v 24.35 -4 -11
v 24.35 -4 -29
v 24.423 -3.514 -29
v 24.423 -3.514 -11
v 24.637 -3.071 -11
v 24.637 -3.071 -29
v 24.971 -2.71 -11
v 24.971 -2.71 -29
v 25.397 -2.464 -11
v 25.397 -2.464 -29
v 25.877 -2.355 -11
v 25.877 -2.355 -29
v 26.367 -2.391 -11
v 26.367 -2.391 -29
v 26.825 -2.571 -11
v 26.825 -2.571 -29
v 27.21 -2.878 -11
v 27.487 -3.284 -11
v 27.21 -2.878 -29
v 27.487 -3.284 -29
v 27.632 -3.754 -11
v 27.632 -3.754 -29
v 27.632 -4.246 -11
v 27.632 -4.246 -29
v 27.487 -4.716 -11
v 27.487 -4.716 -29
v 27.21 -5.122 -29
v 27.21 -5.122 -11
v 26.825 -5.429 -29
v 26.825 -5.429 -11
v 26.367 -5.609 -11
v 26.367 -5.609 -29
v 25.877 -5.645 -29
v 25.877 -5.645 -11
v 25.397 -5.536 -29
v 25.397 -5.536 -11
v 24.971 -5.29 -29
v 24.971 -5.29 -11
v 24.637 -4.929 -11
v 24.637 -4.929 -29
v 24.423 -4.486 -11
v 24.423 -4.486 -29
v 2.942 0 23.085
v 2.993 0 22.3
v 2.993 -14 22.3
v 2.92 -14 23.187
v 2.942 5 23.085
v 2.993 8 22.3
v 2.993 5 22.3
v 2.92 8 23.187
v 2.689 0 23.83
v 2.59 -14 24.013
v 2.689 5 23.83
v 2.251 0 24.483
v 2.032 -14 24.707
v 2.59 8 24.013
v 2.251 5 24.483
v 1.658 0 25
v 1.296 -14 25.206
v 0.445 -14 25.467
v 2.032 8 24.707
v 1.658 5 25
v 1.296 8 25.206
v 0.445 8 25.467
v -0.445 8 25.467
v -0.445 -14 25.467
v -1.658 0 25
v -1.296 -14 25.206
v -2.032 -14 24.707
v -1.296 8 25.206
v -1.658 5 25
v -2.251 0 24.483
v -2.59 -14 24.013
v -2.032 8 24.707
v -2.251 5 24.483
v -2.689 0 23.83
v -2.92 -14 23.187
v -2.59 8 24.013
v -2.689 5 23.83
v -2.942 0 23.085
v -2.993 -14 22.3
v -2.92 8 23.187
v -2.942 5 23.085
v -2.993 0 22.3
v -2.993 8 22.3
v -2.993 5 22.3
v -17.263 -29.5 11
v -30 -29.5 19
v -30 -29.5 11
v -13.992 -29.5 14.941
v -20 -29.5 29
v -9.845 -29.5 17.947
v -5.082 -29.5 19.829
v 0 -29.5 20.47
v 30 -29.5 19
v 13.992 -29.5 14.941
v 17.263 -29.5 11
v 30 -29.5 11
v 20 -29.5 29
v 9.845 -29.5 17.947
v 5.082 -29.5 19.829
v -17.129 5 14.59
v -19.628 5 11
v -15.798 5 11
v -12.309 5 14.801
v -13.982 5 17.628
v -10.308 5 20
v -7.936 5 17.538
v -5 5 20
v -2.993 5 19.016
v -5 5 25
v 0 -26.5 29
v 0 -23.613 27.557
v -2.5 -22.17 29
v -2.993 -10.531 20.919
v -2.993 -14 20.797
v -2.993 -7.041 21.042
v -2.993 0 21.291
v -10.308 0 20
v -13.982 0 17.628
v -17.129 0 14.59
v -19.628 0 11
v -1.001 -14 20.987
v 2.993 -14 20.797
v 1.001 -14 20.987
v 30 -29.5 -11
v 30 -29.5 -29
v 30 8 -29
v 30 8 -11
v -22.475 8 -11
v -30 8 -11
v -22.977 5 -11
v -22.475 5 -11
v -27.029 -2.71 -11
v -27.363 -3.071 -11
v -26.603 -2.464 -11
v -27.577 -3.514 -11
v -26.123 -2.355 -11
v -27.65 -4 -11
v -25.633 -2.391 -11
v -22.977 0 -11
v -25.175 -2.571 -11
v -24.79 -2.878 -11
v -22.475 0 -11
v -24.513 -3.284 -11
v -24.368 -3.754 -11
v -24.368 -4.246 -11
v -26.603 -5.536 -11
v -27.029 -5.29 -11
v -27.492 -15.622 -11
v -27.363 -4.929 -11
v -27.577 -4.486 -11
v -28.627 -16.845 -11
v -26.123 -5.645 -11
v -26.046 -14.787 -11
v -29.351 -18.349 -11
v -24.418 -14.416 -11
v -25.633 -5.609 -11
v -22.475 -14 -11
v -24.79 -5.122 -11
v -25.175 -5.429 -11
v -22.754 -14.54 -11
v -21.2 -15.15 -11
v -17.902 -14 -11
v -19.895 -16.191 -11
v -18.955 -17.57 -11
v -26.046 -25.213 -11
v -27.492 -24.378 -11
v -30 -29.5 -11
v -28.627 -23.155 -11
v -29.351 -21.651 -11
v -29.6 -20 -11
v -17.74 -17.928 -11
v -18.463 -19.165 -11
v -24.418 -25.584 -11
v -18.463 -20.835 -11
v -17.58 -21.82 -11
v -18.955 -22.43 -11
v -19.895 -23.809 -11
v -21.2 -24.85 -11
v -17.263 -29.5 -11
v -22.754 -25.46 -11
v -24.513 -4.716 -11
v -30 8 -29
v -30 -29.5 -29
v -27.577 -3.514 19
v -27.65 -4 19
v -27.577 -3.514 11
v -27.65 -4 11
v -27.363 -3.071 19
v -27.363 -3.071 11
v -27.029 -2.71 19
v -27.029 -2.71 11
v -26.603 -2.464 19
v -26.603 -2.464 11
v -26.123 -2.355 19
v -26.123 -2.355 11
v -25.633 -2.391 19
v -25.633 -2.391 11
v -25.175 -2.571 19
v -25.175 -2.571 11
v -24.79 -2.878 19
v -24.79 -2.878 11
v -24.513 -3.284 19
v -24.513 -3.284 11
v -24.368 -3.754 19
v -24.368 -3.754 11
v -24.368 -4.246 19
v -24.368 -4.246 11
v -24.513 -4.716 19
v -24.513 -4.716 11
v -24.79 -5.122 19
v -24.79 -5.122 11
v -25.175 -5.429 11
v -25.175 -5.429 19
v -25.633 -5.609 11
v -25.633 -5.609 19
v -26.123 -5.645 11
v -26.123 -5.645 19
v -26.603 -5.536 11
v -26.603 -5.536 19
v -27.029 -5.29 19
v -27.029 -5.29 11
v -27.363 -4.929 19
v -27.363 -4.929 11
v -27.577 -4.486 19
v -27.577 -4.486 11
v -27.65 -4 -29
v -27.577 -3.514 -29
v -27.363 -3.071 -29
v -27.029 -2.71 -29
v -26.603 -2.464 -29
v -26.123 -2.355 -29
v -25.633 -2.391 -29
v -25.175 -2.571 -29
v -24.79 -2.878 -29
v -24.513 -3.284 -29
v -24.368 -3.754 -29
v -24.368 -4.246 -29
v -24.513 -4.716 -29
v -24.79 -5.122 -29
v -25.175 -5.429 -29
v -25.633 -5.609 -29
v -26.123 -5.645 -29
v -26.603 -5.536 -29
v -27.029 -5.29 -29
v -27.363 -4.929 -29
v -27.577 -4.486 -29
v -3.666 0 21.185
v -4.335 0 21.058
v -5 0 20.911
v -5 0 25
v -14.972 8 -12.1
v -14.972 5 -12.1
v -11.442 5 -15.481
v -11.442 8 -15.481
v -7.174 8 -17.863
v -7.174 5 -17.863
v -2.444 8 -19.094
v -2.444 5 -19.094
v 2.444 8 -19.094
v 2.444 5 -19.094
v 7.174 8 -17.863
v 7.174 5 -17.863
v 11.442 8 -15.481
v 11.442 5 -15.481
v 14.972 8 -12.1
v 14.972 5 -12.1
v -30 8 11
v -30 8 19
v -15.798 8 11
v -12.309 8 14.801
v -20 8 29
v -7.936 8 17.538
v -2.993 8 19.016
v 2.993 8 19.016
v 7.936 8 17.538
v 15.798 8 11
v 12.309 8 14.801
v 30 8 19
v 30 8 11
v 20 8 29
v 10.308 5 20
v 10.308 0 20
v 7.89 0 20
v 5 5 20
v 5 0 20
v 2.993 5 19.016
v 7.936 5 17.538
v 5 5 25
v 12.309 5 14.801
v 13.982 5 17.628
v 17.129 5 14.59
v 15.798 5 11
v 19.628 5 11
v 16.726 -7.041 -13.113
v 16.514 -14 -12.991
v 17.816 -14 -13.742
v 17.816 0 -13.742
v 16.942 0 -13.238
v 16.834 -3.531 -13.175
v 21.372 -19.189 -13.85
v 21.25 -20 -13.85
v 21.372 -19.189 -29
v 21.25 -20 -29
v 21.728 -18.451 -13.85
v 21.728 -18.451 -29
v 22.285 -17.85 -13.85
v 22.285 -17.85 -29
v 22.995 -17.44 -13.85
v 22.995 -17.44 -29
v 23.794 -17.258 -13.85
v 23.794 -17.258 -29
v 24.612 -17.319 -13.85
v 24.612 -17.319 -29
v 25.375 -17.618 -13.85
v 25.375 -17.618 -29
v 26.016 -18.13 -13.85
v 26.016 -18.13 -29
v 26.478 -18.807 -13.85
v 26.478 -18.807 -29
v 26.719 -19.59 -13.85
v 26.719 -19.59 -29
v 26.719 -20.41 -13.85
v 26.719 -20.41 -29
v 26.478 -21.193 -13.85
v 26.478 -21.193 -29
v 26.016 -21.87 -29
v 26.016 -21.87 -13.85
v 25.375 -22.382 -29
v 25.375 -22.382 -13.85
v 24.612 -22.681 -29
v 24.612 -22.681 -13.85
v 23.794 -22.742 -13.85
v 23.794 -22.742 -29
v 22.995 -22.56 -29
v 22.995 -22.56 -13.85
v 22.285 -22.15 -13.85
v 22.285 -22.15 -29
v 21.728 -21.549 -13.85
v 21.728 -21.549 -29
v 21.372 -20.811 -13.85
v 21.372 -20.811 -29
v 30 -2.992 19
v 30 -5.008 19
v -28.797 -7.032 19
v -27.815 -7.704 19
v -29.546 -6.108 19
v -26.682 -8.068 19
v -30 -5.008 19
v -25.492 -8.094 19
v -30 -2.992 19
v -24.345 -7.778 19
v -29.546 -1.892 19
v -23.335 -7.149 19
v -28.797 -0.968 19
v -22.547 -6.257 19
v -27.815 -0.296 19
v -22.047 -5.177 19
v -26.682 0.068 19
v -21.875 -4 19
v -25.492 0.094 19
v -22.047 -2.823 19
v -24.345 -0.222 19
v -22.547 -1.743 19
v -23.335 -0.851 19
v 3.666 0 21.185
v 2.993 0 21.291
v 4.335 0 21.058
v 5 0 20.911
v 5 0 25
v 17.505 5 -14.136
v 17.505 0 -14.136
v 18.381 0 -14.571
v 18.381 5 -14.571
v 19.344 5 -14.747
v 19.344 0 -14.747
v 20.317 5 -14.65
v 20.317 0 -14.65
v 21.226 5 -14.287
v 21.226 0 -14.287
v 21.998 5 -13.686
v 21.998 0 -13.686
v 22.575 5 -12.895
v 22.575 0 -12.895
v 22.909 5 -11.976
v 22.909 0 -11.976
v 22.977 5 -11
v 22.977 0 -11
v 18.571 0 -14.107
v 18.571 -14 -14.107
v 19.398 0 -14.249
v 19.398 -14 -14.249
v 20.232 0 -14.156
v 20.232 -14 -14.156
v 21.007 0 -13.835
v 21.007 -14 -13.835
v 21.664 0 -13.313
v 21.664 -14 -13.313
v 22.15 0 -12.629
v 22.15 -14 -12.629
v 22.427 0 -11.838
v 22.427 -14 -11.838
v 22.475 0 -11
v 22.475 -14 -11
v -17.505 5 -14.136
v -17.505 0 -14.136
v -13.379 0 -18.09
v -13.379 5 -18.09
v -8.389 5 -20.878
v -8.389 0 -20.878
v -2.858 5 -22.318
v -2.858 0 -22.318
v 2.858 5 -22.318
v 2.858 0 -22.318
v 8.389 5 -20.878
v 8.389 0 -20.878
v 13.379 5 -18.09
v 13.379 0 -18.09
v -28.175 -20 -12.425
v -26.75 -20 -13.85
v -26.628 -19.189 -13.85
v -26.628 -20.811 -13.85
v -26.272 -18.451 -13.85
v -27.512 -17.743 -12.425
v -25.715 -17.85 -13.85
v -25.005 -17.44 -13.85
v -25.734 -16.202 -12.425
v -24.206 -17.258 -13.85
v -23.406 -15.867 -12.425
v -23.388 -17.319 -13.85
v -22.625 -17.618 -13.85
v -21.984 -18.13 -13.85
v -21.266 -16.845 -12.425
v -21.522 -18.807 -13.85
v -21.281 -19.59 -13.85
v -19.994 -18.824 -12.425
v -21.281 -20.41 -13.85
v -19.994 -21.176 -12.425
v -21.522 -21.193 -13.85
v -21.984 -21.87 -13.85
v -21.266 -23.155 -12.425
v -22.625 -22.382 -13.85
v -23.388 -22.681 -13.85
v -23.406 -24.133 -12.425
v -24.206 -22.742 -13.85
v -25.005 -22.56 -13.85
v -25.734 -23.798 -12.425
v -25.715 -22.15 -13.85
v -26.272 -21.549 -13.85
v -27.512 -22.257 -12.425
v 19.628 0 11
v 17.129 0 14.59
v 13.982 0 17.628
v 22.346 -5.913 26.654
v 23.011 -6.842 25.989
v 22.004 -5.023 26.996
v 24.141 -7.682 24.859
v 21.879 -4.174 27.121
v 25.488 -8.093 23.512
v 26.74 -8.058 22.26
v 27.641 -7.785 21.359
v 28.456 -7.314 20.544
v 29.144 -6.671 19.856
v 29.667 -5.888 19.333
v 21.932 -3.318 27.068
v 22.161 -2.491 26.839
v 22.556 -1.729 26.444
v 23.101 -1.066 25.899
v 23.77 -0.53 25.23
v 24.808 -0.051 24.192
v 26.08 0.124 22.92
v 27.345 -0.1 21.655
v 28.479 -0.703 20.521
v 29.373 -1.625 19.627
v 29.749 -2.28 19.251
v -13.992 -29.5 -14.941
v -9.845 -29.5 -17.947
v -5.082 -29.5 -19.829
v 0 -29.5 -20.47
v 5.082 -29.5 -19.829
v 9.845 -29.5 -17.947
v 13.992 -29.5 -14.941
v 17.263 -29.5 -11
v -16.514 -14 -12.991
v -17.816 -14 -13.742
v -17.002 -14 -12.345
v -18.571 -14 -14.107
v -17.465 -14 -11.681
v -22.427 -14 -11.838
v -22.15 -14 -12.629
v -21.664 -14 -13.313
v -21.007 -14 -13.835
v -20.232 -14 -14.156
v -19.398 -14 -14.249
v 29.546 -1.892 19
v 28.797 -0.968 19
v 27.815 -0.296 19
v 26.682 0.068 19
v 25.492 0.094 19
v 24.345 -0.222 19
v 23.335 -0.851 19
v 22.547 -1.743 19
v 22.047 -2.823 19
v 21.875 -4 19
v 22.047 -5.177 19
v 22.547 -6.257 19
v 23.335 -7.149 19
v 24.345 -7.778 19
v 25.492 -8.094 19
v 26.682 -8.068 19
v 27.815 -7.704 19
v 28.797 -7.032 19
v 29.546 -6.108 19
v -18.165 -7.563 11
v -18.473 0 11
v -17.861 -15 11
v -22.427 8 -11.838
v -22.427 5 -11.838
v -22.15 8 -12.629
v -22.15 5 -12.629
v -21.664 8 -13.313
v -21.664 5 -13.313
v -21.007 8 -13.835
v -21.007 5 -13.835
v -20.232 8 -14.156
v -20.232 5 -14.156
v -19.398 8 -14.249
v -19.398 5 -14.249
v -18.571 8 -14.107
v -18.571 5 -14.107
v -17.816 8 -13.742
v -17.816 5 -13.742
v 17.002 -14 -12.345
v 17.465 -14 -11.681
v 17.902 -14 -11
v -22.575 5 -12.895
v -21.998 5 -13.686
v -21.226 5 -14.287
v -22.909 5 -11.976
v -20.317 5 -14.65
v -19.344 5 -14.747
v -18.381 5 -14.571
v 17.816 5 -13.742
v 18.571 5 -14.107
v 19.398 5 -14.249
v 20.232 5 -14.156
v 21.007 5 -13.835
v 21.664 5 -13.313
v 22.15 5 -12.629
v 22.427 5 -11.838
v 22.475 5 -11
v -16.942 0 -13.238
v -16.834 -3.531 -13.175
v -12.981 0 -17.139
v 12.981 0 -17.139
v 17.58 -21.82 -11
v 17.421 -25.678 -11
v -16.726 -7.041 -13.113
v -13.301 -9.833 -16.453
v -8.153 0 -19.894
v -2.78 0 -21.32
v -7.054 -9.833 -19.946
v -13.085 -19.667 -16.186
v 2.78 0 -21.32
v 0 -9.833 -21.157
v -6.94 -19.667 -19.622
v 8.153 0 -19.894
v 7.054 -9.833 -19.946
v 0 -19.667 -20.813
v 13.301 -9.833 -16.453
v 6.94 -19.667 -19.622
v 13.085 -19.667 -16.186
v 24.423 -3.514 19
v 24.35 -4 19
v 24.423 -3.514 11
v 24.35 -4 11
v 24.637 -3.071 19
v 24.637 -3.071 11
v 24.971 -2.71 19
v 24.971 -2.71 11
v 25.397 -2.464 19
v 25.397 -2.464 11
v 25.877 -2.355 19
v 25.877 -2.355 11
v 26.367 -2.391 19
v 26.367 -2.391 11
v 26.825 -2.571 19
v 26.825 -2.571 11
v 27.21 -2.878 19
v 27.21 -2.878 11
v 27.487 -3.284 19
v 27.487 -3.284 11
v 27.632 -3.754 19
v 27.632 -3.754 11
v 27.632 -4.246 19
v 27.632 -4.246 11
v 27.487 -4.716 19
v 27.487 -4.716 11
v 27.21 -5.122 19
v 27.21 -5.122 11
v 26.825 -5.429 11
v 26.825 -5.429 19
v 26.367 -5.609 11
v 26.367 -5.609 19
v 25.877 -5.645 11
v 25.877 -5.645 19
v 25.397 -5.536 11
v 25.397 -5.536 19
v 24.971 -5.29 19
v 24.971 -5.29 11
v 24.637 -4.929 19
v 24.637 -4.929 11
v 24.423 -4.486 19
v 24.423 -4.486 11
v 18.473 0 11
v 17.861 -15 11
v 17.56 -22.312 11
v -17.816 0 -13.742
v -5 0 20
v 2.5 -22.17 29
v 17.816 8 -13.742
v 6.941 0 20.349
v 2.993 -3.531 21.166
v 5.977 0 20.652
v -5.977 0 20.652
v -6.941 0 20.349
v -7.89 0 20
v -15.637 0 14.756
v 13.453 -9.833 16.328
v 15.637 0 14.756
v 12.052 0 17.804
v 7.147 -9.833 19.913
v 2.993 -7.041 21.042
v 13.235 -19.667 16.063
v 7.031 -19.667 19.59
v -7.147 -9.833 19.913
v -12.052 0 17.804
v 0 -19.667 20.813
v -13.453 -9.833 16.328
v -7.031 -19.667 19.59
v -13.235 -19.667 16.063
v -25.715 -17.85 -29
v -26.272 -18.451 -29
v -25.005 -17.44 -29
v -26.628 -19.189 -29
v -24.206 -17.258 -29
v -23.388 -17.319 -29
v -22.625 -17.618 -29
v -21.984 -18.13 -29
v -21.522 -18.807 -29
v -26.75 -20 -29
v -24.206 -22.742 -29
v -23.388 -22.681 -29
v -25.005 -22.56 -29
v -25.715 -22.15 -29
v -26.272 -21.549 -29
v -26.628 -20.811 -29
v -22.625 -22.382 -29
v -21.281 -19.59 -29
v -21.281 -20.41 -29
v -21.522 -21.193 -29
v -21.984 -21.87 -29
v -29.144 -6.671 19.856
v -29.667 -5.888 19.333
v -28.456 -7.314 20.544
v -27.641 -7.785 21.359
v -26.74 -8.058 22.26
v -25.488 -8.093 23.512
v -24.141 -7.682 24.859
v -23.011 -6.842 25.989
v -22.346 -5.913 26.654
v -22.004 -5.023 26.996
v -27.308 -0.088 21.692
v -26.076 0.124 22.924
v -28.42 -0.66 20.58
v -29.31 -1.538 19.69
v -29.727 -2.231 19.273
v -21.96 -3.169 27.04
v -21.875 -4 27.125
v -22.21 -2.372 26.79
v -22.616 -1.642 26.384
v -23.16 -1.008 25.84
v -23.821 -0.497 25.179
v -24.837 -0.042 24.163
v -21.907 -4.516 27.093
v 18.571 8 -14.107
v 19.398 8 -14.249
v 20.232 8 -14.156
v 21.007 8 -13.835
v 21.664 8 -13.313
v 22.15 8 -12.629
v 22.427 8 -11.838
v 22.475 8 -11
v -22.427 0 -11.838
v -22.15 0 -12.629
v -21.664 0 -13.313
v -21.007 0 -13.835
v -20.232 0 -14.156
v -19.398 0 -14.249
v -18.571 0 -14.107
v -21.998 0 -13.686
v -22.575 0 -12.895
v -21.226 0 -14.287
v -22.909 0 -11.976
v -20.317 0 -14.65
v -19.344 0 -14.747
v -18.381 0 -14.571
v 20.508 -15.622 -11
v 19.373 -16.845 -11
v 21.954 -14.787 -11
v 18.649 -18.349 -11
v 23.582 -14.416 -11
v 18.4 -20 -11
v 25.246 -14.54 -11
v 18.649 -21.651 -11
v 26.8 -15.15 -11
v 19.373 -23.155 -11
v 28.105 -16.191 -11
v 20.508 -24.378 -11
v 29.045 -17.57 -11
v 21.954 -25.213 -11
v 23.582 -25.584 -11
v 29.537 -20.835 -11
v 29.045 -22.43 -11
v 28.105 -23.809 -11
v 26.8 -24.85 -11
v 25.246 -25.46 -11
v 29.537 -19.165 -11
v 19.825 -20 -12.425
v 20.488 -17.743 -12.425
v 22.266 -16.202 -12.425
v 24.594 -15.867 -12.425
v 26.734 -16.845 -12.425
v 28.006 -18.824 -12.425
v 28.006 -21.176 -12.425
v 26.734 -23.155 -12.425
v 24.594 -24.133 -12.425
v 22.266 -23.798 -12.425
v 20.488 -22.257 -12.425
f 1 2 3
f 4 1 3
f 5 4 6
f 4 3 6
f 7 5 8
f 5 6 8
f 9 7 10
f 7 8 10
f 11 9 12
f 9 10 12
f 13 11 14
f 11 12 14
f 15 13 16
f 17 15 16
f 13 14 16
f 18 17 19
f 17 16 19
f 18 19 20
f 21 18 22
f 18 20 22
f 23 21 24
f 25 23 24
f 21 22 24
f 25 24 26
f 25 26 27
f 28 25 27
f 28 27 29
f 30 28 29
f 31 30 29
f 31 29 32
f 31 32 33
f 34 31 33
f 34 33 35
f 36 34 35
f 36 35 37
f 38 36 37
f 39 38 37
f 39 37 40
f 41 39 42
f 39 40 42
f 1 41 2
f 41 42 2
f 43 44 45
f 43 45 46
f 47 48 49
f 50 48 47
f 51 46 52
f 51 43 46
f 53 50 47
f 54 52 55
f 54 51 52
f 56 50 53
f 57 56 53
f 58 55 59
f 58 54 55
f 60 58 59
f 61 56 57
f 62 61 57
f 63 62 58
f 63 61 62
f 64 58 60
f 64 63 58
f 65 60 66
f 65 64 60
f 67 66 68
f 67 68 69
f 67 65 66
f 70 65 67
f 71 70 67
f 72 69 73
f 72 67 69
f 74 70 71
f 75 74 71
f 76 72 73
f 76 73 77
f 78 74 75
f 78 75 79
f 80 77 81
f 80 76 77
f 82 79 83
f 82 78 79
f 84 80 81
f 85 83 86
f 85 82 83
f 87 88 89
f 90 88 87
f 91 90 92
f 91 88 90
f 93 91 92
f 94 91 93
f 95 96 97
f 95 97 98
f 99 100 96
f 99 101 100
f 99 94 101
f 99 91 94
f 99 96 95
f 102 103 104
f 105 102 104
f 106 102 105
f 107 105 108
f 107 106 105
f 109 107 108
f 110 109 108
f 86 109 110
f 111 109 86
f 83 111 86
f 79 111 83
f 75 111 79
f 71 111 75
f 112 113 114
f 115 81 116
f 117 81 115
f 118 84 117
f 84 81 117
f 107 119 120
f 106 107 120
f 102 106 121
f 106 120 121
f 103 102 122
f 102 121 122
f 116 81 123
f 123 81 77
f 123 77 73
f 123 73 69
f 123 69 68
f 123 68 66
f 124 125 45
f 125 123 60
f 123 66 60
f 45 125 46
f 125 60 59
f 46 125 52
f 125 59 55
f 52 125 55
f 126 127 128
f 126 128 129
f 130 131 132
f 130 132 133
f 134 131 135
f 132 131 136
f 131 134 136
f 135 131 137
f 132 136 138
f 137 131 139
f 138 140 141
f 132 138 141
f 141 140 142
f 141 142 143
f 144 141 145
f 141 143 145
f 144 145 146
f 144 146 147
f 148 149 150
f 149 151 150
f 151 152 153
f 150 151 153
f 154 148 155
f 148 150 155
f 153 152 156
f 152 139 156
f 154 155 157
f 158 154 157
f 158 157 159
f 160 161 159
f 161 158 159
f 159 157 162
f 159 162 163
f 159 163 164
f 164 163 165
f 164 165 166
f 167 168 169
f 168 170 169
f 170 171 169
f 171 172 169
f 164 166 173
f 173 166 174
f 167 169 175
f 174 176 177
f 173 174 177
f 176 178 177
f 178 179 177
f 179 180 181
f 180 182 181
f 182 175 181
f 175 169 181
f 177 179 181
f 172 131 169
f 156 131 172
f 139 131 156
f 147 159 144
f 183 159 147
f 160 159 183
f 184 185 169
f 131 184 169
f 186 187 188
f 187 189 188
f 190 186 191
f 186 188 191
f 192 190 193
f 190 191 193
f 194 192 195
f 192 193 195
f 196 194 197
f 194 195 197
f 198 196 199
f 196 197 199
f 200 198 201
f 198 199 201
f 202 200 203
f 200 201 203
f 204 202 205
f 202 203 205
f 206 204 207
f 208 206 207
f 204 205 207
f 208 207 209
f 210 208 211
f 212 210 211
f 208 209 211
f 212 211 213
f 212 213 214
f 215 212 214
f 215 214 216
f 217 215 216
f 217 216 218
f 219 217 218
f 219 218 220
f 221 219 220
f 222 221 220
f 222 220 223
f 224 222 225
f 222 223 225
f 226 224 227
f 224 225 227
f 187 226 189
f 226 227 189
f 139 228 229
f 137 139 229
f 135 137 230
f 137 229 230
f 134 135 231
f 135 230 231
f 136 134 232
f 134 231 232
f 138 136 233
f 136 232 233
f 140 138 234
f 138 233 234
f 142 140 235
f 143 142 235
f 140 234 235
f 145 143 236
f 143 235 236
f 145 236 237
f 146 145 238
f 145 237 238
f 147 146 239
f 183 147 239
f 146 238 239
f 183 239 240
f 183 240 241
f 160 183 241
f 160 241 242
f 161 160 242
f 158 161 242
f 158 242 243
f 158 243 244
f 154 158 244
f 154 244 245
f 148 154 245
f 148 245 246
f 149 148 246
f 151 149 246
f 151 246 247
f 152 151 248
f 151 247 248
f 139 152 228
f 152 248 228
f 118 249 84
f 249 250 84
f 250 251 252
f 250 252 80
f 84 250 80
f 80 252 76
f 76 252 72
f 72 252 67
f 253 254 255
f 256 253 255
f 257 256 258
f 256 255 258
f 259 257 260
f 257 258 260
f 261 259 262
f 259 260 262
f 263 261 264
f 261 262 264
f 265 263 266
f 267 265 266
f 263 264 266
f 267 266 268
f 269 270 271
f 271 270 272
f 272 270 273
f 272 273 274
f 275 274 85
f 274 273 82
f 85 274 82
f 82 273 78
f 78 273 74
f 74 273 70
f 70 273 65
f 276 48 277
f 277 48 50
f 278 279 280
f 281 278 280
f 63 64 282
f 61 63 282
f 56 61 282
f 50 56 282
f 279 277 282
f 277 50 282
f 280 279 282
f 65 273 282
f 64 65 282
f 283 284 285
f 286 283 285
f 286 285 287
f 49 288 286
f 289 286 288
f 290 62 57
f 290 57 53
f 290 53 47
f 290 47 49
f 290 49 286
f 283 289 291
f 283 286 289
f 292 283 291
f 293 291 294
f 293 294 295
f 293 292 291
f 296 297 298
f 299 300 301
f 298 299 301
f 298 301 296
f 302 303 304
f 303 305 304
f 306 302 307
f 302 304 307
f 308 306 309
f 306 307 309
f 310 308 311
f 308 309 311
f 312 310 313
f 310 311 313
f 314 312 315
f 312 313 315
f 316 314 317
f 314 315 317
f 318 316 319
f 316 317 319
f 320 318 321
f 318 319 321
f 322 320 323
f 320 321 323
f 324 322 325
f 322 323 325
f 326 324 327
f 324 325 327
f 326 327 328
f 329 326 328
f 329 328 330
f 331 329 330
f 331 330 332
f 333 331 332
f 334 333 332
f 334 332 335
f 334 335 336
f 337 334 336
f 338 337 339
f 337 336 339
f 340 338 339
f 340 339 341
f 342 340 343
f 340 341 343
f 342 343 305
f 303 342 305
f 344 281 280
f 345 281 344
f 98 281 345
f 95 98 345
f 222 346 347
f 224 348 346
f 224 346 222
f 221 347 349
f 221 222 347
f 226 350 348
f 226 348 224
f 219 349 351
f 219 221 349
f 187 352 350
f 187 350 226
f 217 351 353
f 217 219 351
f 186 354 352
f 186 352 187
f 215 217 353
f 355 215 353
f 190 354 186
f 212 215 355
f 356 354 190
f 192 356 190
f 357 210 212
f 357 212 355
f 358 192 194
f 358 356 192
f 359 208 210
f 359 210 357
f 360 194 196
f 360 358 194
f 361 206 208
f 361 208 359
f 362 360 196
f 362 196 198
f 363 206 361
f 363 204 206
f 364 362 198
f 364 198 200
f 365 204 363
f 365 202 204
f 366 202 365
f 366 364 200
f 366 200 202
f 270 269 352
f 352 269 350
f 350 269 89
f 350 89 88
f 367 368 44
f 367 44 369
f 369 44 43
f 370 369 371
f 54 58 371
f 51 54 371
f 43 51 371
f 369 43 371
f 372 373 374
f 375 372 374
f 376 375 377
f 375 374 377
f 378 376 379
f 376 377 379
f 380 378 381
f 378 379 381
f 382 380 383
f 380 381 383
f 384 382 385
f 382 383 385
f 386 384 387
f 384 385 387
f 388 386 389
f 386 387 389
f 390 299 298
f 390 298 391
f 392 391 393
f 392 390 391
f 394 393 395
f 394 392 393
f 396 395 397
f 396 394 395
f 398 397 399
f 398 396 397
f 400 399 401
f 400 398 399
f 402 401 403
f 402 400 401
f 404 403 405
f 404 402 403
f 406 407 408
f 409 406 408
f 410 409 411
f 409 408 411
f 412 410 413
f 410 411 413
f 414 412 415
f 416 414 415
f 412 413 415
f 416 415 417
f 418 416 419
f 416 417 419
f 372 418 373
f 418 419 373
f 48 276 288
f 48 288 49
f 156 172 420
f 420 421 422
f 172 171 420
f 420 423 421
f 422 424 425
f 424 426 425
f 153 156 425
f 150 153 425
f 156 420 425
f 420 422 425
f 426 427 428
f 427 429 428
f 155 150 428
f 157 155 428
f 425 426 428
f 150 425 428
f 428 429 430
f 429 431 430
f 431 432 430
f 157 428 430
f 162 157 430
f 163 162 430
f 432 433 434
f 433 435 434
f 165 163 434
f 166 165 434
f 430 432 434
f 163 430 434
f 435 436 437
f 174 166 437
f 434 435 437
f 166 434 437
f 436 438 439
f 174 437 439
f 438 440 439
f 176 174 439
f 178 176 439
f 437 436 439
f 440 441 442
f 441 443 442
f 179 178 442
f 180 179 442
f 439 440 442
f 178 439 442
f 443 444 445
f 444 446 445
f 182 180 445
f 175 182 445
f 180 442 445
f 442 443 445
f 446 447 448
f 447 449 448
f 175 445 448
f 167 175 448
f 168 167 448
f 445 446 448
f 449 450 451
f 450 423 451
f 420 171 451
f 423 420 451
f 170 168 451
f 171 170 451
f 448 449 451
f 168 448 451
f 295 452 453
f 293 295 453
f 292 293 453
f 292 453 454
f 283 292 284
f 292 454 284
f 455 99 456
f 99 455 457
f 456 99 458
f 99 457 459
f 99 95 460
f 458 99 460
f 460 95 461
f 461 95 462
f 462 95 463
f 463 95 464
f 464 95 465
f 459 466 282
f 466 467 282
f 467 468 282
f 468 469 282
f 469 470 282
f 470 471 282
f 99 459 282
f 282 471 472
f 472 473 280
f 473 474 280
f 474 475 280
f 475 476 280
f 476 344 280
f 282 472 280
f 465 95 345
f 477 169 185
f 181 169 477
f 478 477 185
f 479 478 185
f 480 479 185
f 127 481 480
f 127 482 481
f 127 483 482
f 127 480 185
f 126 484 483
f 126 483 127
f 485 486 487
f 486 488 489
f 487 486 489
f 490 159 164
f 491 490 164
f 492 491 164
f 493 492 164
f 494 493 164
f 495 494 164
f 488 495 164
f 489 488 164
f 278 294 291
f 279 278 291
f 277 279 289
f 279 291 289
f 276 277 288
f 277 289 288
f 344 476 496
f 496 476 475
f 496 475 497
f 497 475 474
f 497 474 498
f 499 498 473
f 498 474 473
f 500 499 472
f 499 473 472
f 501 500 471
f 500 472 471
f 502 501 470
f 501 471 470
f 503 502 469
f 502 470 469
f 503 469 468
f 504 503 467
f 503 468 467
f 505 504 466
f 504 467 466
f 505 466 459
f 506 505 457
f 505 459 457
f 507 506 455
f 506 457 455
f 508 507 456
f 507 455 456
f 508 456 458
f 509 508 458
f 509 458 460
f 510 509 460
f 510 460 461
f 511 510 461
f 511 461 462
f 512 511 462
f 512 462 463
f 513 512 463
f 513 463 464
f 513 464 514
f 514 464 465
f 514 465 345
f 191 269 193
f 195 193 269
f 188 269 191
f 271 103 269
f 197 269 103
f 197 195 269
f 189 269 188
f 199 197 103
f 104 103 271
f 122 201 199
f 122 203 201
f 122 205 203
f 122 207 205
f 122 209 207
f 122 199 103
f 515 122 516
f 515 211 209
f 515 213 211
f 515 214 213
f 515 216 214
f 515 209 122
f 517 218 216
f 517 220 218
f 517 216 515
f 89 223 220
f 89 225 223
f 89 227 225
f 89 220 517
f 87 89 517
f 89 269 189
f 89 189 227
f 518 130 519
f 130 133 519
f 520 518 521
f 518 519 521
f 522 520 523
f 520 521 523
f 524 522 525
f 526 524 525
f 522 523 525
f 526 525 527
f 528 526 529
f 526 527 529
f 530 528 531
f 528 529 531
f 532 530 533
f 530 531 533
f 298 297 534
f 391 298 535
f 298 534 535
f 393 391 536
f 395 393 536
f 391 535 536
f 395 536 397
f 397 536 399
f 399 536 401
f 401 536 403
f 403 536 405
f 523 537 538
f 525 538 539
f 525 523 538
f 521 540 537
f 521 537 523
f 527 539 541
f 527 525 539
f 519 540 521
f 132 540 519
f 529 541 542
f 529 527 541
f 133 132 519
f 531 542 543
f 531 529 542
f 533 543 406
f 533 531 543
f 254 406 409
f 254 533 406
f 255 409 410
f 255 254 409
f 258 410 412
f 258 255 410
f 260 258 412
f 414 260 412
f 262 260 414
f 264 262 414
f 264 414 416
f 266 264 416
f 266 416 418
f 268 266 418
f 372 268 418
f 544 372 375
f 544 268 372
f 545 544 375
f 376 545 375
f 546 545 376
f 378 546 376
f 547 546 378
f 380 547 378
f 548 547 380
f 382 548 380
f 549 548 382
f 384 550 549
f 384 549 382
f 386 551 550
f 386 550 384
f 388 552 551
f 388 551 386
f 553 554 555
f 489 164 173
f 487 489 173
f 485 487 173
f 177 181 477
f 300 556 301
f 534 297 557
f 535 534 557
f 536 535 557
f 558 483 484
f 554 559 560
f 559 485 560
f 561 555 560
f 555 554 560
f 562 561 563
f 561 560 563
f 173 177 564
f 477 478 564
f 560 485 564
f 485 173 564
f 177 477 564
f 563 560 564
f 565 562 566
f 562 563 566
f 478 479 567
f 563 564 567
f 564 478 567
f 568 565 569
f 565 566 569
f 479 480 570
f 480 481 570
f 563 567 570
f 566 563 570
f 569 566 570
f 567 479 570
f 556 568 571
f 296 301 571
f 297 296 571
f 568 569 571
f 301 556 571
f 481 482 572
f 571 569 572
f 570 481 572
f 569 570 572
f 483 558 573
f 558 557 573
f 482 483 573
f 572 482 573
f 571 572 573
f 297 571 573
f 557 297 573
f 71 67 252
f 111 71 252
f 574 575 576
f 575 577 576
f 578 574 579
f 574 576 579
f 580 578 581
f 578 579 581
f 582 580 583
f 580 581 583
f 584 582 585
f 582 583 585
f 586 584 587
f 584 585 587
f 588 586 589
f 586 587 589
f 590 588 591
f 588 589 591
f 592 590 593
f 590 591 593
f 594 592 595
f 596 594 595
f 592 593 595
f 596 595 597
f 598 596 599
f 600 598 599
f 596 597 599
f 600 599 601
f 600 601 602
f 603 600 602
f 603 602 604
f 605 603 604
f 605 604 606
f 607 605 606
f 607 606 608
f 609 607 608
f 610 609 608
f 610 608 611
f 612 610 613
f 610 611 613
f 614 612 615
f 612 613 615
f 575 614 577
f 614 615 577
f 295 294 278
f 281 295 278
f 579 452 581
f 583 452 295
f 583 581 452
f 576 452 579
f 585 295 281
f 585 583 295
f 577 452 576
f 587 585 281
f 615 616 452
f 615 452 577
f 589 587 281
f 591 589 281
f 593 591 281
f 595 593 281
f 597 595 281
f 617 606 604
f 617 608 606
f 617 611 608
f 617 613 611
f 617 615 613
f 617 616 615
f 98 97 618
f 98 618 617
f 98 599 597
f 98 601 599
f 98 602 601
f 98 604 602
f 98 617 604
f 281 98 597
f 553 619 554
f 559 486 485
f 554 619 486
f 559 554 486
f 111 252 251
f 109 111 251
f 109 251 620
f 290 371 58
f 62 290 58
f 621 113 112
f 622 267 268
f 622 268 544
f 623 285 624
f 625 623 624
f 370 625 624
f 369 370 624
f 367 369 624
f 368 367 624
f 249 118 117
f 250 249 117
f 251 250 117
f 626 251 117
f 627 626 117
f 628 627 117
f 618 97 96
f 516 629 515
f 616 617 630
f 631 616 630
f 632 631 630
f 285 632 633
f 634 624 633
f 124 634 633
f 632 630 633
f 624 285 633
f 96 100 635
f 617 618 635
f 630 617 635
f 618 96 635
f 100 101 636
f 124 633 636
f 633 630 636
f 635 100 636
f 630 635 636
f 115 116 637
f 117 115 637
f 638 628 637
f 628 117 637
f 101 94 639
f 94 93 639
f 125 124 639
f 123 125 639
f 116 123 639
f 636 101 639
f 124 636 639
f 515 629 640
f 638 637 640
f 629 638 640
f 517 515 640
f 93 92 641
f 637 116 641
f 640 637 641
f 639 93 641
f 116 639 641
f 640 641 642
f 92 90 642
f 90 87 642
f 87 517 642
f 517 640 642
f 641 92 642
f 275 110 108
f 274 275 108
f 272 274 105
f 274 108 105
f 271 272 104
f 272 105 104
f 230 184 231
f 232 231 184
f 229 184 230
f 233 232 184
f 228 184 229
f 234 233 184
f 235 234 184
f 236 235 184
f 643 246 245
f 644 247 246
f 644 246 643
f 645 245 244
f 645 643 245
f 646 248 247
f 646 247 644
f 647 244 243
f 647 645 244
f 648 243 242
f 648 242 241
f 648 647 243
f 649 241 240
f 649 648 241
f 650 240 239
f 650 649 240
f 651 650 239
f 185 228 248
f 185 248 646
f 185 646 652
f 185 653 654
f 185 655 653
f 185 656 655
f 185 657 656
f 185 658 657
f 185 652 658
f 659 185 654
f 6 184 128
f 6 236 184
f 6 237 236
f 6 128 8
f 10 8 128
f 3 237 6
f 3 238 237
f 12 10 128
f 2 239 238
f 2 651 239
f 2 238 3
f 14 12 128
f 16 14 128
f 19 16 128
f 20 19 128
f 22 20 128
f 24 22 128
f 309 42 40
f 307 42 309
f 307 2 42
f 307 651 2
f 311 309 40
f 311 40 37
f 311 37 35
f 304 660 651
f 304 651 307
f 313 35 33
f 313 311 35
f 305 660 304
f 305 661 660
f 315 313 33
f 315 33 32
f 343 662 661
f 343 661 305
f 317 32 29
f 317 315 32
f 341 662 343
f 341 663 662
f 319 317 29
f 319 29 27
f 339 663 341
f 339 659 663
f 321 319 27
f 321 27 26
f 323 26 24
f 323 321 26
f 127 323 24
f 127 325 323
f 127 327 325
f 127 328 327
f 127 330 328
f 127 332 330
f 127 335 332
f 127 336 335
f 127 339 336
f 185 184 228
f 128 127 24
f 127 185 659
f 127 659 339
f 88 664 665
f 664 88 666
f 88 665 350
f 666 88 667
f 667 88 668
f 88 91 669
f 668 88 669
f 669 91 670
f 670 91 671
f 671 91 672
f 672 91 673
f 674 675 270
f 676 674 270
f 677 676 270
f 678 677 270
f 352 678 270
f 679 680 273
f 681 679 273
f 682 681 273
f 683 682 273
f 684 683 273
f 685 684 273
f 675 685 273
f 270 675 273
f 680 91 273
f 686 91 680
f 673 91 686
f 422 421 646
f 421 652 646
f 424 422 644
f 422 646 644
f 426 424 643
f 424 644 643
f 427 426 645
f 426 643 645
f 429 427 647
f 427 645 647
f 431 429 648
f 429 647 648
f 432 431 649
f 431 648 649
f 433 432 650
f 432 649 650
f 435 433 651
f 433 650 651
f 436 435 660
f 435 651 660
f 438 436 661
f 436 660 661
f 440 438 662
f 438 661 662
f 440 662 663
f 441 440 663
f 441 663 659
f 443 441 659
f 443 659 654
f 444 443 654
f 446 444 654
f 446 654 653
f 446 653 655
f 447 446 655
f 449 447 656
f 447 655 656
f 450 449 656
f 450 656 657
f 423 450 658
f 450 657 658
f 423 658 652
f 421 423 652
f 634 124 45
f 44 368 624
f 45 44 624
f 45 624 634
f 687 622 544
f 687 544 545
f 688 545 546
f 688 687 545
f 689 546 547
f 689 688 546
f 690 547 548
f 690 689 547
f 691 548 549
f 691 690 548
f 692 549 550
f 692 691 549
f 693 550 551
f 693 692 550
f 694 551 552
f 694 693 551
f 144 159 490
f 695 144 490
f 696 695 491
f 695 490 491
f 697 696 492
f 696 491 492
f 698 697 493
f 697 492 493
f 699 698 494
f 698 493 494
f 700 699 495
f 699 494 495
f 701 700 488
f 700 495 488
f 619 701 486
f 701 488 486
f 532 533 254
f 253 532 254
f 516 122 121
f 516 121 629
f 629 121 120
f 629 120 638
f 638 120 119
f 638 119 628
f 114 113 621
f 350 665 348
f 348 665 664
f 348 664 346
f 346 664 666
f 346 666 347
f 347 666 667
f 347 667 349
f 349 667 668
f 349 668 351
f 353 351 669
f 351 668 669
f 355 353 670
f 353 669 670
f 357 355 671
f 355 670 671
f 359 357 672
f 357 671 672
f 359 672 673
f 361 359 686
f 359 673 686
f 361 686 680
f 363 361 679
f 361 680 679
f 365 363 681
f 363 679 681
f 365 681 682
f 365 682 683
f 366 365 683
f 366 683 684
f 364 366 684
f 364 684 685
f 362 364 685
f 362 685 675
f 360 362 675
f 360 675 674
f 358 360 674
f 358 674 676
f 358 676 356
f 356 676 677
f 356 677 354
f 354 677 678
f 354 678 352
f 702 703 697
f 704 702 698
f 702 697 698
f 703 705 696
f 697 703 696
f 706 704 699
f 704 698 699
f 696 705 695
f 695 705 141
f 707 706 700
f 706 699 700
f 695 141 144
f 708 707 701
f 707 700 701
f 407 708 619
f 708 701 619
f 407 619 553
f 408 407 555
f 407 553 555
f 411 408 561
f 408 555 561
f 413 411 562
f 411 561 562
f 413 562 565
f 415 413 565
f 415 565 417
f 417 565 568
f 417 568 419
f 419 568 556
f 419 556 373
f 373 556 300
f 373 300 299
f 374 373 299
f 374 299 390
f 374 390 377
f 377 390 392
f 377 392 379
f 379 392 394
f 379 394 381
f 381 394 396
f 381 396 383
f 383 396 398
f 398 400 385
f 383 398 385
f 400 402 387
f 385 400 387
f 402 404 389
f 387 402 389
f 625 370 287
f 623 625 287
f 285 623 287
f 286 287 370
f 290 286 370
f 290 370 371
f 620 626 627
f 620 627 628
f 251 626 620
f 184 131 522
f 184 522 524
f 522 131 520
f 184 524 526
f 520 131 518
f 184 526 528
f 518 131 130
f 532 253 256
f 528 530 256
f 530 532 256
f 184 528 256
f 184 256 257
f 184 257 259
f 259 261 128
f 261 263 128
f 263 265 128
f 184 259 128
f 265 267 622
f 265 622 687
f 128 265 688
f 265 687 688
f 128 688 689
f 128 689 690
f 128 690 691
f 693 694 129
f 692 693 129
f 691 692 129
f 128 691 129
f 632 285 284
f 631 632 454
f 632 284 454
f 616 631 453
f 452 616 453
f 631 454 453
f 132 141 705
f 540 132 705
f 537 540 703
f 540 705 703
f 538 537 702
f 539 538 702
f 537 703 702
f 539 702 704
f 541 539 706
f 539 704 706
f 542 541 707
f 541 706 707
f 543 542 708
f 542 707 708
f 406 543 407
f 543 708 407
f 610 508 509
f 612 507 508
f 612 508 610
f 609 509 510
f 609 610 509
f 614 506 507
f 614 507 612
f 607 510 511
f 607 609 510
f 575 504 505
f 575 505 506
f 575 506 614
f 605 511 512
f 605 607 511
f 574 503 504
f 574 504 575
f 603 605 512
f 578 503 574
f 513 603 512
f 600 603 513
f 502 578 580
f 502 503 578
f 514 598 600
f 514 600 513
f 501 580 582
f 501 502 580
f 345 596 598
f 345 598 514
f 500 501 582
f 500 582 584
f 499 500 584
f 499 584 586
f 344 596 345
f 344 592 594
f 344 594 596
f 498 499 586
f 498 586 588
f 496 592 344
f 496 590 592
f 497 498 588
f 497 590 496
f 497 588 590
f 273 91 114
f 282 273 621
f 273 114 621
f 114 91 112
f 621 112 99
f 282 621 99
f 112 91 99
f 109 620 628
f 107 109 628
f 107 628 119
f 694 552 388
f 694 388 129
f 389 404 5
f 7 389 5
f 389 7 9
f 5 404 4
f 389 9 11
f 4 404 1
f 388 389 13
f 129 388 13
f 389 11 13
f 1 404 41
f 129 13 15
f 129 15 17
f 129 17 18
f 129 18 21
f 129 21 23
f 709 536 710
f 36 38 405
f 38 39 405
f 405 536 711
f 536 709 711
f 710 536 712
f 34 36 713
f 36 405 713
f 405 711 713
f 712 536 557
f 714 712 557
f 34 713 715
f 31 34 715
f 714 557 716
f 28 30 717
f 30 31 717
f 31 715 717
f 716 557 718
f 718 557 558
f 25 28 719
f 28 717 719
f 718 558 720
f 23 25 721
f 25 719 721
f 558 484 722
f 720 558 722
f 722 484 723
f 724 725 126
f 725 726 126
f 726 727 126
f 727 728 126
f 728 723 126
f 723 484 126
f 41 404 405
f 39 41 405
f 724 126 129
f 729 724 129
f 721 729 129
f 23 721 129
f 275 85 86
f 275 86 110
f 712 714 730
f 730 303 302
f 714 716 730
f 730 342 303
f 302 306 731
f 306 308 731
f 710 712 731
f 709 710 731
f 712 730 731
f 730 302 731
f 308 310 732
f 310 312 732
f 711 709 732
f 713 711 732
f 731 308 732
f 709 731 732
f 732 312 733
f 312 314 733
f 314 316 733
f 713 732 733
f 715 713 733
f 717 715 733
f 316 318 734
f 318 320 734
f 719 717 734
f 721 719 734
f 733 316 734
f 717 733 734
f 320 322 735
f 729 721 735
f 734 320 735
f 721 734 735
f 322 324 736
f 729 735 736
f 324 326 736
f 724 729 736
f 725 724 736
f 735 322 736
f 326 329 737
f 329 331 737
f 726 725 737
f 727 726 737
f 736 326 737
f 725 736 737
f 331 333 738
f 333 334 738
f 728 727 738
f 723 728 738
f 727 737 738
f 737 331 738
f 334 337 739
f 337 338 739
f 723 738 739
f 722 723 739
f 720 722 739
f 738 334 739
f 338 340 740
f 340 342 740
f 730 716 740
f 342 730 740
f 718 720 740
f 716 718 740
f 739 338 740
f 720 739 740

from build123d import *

# Parameters (mm, degrees)
F1_W              = 60
F1_H              = 18
F2_DEPTH          = 29.5
F2_DEPTH_BACK     = 8
F3_DEPTH          = 5
F4_R              = 19.25
F5_DEPTH          = 25
F6_R              = 21.5
F7_DEPTH          = 30
F7_TAPER          = 2
F9_DEPTH          = 14
F12_SIZE          = 10
F14_D             = 5.5
F14_DEPTH         = 40
F14_CSINK_D       = 11.2
F14_CSINK_ANGLE   = 90
F14_TIP           = 1.6523667023
F16_D             = 3.3
F16_DEPTH         = 58
F16_CBORE_D       = 8.25
F16_CBORE_DEPTH   = 10
F16_TIP           = 0.9914200214
F16_2_D           = 3.3
F16_2_DEPTH       = 58
F16_2_CBORE_D     = 8.25
F16_2_CBORE_DEPTH = 10
F16_2_TIP         = 0.9914200214


# Not quite as in the source:
# - an extrude whose draft closes it to a point is written as a loft to that point


with BuildPart() as f2:
    # F1 (on Front) → F2 (new body, two sides)
    with BuildSketch(Plane.XZ) as f2_sk:
        with Locations((0, -20)):
            Rectangle(F1_W, F1_H)
    extrude(amount=F2_DEPTH)
    extrude(f2_sk.sketch, amount=-F2_DEPTH_BACK)


with BuildPart() as f2b:
    # F1 (on Front) → F2, piece 2 (new body, two sides)
    with BuildSketch(Plane.XZ) as f2_2_sk:
        with Locations((0, 20)):
            Rectangle(F1_W, F1_H)
    extrude(amount=F2_DEPTH)
    extrude(f2_2_sk.sketch, amount=-F2_DEPTH_BACK)


with BuildPart() as f3_tool:
    # F0 (on Front) → F3 (new body)
    with BuildSketch(Plane.XZ):
        with BuildLine():
            Line((-5, 20.0000014156), (-10.3077613174, 20.0000014156))
            ThreePointArc((-10.3077613174, 20.0000014156), (-21.0296949807, 8.0001205627), (-20.9945189859, -8.0919819915))
            ThreePointArc((-20.9945189859, -8.0919819915), (-22.5166604984, -13), (-17.5051214646, -14.1357957862))
            ThreePointArc((-17.5051214646, -14.1357957862), (0, -22.5), (17.5051214646, -14.1357957862))
            ThreePointArc((17.5051214646, -14.1357957862), (22.5166604984, -13), (20.9945189859, -8.0919819915))
            ThreePointArc((20.9945189859, -8.0919819915), (21.0296949807, 8.0001205627), (10.3077613174, 20.0000014156))
            Line((10.3077613174, 20.0000014156), (5, 20.0000014156))
            Line((5, 20.0000014156), (5, 24.9999985844))
            Line((5, 24.9999985844), (-5, 24.9999985844))
            Line((-5, 24.9999985844), (-5, 20.0000014156))
        make_face()
    extrude(amount=-F3_DEPTH)


with BuildPart() as f2_1:
    add(f2.part)

    # F3: cut by f3_tool
    add(f3_tool.part, mode=Mode.SUBTRACT)


with BuildPart() as f2b_1:
    add(f2b.part)

    # F3: cut by f3_tool
    add(f3_tool.part, mode=Mode.SUBTRACT)


with BuildPart() as f5_tool:
    # F4 (on Front) → F5 (new body)
    with BuildSketch(Plane.XZ):
        Circle(F4_R)
    extrude(amount=-F5_DEPTH)


with BuildPart() as f2_2:
    add(f2_1.part)

    # F5: cut by f5_tool
    add(f5_tool.part, mode=Mode.SUBTRACT)


with BuildPart() as f2b_2:
    add(f2b_1.part)

    # F5: cut by f5_tool
    add(f5_tool.part, mode=Mode.SUBTRACT)


with BuildPart() as f7_tool:
    # F6 (on Front) → F7 (new body)
    with BuildSketch(Plane.XZ):
        Circle(F6_R)
    extrude(amount=F7_DEPTH, taper=F7_TAPER)


with BuildPart() as f2_3:
    add(f2_2.part)

    # F7: cut by f7_tool
    add(f7_tool.part, mode=Mode.SUBTRACT)


with BuildPart() as f2b_3:
    add(f2b_2.part)

    # F7: cut by f7_tool
    add(f7_tool.part, mode=Mode.SUBTRACT)


with BuildPart() as f9_tool:
    # F8 (on Front) → F9 (new body, symmetric)
    with BuildSketch(Plane.XZ):
        with BuildLine():
            ThreePointArc((2.9933259094, 22.3), (0, 25.5), (-2.9933259094, 22.3))
            Line((-2.9933259094, 22.3), (-2.9933259094, 16.3133481812))
            Line((-2.9933259094, 16.3133481812), (2.9933259094, 16.3133481812))
            Line((2.9933259094, 16.3133481812), (2.9933259094, 22.3))
        make_face()
        with BuildLine():
            ThreePointArc((17.8157035497, -13.7422962794), (22.0836477965, -12.75), (20.8090294591, -8.5577037206))
            Line((20.8090294591, -8.5577037206), (15.6244369004, -5.5643778112))
            Line((15.6244369004, -5.5643778112), (12.631110991, -10.7489703699))
            Line((12.631110991, -10.7489703699), (17.8157035497, -13.7422962794))
        make_face()
        with BuildLine():
            ThreePointArc((-20.8090294591, -8.5577037206), (-22.0836477965, -12.75), (-17.8157035497, -13.7422962794))
            Line((-17.8157035497, -13.7422962794), (-12.631110991, -10.7489703699))
            Line((-12.631110991, -10.7489703699), (-15.6244369004, -5.5643778112))
            Line((-15.6244369004, -5.5643778112), (-20.8090294591, -8.5577037206))
        make_face()
    extrude(amount=F9_DEPTH, both=True)


with BuildPart() as f2_4:
    add(f2_3.part)

    # F9: cut by f9_tool
    add(f9_tool.part, mode=Mode.SUBTRACT)

    # F14
    with Locations(Plane.XY.offset(-11)):
        with Locations((-24, -20), (24, -20)):
            CounterSinkHole(F14_D / 2, F14_CSINK_D / 2, depth=F14_DEPTH, counter_sink_angle=F14_CSINK_ANGLE)
            with Locations((0, 0, -(F14_DEPTH + F14_TIP / 2))):  # 118° drill point
                Cone(0, F14_D / 2, F14_TIP, mode=Mode.SUBTRACT)

    # F16
    with Locations(Plane.XY.offset(29)):
        with Locations((-26, -4), (26, -4)):
            CounterBoreHole(F16_D / 2, F16_CBORE_D / 2, F16_CBORE_DEPTH, depth=F16_DEPTH)
            with Locations((0, 0, -(F16_DEPTH + F16_TIP / 2))):  # 118° drill point
                Cone(0, F16_D / 2, F16_TIP, mode=Mode.SUBTRACT)


with BuildPart() as f2b_4:
    add(f2b_3.part)

    # F9: cut by f9_tool
    add(f9_tool.part, mode=Mode.SUBTRACT)

    # F10 (on face) → F11 section 0
    with BuildSketch(Plane.XY.offset(29), mode=Mode.PRIVATE) as f11_s0:
        Polygon((-2.5, -22.1698729811), (0, -26.5), (2.5, -22.1698729811), align=None)
    loft([f11_s0.sketch, Vertex(0, -23.6132486541, 27.556624327)], ruled=True, mode=Mode.SUBTRACT)

    # F12
    f12_edges = [f2b_4.edges().sort_by_distance(p)[0] for p in [
        (30, -10.75, 29),
        (-30, -10.75, 29),
    ]]
    chamfer(f12_edges, length=F12_SIZE)

    # F16#2
    with Locations(Plane.XY.offset(29)):
        with Locations((-26, -4), (26, -4)):
            CounterBoreHole(F16_2_D / 2, F16_2_CBORE_D / 2, F16_2_CBORE_DEPTH, depth=F16_2_DEPTH)
            with Locations((0, 0, -(F16_2_DEPTH + F16_2_TIP / 2))):  # 118° drill point
                Cone(0, F16_2_D / 2, F16_2_TIP, mode=Mode.SUBTRACT)


solid = Compound([f2_4.part, f2b_4.part])
